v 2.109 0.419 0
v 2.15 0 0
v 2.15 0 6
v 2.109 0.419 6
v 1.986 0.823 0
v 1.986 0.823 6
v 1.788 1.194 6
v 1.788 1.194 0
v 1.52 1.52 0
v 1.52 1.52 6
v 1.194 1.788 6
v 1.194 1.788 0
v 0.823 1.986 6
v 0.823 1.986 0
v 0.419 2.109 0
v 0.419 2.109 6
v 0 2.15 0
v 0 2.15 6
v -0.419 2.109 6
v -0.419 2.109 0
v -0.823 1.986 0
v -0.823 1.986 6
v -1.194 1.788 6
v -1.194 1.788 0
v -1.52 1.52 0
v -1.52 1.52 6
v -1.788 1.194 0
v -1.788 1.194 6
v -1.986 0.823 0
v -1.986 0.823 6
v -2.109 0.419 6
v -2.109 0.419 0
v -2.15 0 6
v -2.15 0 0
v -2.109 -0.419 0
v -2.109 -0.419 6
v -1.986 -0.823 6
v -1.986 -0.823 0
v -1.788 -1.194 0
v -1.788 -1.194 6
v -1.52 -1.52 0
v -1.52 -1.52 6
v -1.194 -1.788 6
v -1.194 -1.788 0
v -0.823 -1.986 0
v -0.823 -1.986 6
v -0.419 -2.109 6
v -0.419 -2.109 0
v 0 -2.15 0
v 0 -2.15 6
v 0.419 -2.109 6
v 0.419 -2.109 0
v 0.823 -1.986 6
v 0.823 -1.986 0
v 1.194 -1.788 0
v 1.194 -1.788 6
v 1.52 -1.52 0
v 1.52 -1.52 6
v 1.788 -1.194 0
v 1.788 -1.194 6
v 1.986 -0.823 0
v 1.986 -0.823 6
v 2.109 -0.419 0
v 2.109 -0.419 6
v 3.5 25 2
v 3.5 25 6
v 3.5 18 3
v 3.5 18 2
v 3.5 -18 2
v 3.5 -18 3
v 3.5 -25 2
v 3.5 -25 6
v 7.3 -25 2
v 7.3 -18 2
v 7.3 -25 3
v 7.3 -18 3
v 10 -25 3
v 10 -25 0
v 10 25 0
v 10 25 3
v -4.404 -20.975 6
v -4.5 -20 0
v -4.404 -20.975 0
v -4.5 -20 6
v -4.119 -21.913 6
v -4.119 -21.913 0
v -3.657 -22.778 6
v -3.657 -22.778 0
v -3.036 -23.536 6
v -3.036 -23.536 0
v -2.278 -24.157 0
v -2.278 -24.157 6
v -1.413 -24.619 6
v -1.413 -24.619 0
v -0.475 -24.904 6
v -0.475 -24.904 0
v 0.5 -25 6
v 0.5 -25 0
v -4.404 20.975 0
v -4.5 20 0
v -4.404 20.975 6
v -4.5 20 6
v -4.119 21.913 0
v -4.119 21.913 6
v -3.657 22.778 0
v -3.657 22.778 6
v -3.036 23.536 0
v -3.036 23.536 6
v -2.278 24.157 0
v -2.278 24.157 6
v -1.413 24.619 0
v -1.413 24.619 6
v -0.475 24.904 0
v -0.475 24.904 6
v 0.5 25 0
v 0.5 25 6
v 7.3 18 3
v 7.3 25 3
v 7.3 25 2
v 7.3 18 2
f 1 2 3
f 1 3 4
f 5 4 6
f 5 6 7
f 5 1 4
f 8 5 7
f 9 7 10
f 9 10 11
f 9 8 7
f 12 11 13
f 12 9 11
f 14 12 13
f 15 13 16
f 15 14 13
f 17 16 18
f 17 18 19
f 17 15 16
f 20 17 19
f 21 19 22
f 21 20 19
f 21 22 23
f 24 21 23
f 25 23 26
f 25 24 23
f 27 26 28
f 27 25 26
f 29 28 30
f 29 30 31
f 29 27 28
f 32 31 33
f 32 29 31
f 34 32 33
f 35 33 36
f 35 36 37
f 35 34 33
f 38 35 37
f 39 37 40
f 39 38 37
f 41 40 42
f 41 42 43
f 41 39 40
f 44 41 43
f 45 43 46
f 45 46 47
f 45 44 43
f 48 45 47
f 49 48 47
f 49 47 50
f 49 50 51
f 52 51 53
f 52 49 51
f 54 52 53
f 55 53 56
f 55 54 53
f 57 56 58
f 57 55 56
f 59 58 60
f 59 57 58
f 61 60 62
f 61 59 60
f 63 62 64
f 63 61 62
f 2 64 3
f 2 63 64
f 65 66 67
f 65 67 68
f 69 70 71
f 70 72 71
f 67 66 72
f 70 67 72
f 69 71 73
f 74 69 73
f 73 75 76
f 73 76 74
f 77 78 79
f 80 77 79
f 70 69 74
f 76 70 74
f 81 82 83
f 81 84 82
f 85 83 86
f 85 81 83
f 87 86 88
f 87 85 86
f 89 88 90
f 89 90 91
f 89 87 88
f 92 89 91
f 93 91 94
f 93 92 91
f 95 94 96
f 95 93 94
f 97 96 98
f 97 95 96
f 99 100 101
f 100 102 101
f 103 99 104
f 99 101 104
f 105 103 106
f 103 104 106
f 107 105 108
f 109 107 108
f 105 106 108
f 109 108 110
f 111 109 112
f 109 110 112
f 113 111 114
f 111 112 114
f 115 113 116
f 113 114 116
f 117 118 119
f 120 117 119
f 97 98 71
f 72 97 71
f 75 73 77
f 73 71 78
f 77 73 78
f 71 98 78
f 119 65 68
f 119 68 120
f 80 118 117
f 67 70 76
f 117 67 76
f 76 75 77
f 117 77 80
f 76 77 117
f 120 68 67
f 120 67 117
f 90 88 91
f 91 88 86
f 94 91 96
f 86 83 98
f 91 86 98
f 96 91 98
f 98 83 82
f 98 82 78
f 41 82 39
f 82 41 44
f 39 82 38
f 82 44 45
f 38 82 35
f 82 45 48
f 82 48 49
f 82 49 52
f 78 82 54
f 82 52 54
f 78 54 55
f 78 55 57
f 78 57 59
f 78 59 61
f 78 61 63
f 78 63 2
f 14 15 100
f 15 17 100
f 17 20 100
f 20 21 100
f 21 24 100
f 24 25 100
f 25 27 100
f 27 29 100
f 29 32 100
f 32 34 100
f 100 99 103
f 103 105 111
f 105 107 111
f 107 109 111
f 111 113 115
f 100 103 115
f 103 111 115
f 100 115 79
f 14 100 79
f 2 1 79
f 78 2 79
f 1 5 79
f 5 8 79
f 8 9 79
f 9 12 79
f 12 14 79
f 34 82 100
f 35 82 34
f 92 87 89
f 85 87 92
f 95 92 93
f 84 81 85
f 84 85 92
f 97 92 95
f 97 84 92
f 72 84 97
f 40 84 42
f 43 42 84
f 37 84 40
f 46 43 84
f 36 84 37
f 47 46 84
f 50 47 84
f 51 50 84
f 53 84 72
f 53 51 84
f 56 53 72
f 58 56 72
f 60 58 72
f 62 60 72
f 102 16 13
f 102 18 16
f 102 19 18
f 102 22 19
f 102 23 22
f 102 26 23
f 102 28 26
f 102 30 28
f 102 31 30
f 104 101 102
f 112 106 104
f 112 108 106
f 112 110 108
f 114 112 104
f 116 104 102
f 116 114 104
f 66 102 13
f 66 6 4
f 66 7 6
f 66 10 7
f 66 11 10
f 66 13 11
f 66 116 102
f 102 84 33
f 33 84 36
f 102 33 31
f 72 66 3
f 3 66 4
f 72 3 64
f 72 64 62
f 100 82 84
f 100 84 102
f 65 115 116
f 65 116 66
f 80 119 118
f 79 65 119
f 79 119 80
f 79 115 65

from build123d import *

# Parameters (mm, degrees)
CROQUIS1_W              = 14.5
CROQUIS1_H              = 50
CROQUIS1_R              = 2.15
SALIENTE_EXTRUIR1_DEPTH = 6
CROQUIS3_W              = 6.5
CROQUIS3_H              = 3
CORTAR_EXTRUIR1_DEPTH   = 50
CROQUIS4_W              = 3.8
CROQUIS4_H              = 1
CORTAR_EXTRUIR2_DEPTH   = 7
CORTAR_EXTRUIR3_START   = -50
CROQUIS4_2_W            = 3.8
CROQUIS4_2_H            = 1
CORTAR_EXTRUIR3_DEPTH   = 7
REDONDEO1_R             = 5


with BuildPart() as part:
    # Croquis1 → Saliente-Extruir1 (new body)
    with BuildSketch(Plane.XY):
        with Locations((2.75, 0)):
            Rectangle(CROQUIS1_W, CROQUIS1_H)
        Circle(CROQUIS1_R, mode=Mode.SUBTRACT)
    extrude(amount=SALIENTE_EXTRUIR1_DEPTH)

    # Croquis3 → Cortar-Extruir1 (cut)
    with BuildSketch(Plane.XZ.offset(25)):
        with Locations((6.75, 4.5)):
            Rectangle(CROQUIS3_W, CROQUIS3_H)
    extrude(amount=-CORTAR_EXTRUIR1_DEPTH, mode=Mode.SUBTRACT)

    # Croquis4 → Cortar-Extruir2 (cut)
    with BuildSketch(Plane(origin=(0, 25, 0), x_dir=(1, 0, 0), z_dir=(0, 1, 0))):
        with Locations((5.4, -2.5)):
            Rectangle(CROQUIS4_W, CROQUIS4_H)
    extrude(amount=-CORTAR_EXTRUIR2_DEPTH, mode=Mode.SUBTRACT)

    # Croquis4<2> → Cortar-Extruir3 (cut)
    with BuildSketch(Plane(origin=(0, 25, 0), x_dir=(1, 0, 0), z_dir=(0, 1, 0)).offset(CORTAR_EXTRUIR3_START)):
        with Locations((5.4, -2.5)):
            Rectangle(CROQUIS4_2_W, CROQUIS4_2_H)
    extrude(amount=CORTAR_EXTRUIR3_DEPTH, mode=Mode.SUBTRACT)

    # Redondeo1
    redondeo1_edges = [part.edges().sort_by_distance(p)[0] for p in [
        (-4.5, 25, 3),
        (-4.5, -25, 3),
    ]]
    fillet(redondeo1_edges, radius=REDONDEO1_R)


solid = part.part
